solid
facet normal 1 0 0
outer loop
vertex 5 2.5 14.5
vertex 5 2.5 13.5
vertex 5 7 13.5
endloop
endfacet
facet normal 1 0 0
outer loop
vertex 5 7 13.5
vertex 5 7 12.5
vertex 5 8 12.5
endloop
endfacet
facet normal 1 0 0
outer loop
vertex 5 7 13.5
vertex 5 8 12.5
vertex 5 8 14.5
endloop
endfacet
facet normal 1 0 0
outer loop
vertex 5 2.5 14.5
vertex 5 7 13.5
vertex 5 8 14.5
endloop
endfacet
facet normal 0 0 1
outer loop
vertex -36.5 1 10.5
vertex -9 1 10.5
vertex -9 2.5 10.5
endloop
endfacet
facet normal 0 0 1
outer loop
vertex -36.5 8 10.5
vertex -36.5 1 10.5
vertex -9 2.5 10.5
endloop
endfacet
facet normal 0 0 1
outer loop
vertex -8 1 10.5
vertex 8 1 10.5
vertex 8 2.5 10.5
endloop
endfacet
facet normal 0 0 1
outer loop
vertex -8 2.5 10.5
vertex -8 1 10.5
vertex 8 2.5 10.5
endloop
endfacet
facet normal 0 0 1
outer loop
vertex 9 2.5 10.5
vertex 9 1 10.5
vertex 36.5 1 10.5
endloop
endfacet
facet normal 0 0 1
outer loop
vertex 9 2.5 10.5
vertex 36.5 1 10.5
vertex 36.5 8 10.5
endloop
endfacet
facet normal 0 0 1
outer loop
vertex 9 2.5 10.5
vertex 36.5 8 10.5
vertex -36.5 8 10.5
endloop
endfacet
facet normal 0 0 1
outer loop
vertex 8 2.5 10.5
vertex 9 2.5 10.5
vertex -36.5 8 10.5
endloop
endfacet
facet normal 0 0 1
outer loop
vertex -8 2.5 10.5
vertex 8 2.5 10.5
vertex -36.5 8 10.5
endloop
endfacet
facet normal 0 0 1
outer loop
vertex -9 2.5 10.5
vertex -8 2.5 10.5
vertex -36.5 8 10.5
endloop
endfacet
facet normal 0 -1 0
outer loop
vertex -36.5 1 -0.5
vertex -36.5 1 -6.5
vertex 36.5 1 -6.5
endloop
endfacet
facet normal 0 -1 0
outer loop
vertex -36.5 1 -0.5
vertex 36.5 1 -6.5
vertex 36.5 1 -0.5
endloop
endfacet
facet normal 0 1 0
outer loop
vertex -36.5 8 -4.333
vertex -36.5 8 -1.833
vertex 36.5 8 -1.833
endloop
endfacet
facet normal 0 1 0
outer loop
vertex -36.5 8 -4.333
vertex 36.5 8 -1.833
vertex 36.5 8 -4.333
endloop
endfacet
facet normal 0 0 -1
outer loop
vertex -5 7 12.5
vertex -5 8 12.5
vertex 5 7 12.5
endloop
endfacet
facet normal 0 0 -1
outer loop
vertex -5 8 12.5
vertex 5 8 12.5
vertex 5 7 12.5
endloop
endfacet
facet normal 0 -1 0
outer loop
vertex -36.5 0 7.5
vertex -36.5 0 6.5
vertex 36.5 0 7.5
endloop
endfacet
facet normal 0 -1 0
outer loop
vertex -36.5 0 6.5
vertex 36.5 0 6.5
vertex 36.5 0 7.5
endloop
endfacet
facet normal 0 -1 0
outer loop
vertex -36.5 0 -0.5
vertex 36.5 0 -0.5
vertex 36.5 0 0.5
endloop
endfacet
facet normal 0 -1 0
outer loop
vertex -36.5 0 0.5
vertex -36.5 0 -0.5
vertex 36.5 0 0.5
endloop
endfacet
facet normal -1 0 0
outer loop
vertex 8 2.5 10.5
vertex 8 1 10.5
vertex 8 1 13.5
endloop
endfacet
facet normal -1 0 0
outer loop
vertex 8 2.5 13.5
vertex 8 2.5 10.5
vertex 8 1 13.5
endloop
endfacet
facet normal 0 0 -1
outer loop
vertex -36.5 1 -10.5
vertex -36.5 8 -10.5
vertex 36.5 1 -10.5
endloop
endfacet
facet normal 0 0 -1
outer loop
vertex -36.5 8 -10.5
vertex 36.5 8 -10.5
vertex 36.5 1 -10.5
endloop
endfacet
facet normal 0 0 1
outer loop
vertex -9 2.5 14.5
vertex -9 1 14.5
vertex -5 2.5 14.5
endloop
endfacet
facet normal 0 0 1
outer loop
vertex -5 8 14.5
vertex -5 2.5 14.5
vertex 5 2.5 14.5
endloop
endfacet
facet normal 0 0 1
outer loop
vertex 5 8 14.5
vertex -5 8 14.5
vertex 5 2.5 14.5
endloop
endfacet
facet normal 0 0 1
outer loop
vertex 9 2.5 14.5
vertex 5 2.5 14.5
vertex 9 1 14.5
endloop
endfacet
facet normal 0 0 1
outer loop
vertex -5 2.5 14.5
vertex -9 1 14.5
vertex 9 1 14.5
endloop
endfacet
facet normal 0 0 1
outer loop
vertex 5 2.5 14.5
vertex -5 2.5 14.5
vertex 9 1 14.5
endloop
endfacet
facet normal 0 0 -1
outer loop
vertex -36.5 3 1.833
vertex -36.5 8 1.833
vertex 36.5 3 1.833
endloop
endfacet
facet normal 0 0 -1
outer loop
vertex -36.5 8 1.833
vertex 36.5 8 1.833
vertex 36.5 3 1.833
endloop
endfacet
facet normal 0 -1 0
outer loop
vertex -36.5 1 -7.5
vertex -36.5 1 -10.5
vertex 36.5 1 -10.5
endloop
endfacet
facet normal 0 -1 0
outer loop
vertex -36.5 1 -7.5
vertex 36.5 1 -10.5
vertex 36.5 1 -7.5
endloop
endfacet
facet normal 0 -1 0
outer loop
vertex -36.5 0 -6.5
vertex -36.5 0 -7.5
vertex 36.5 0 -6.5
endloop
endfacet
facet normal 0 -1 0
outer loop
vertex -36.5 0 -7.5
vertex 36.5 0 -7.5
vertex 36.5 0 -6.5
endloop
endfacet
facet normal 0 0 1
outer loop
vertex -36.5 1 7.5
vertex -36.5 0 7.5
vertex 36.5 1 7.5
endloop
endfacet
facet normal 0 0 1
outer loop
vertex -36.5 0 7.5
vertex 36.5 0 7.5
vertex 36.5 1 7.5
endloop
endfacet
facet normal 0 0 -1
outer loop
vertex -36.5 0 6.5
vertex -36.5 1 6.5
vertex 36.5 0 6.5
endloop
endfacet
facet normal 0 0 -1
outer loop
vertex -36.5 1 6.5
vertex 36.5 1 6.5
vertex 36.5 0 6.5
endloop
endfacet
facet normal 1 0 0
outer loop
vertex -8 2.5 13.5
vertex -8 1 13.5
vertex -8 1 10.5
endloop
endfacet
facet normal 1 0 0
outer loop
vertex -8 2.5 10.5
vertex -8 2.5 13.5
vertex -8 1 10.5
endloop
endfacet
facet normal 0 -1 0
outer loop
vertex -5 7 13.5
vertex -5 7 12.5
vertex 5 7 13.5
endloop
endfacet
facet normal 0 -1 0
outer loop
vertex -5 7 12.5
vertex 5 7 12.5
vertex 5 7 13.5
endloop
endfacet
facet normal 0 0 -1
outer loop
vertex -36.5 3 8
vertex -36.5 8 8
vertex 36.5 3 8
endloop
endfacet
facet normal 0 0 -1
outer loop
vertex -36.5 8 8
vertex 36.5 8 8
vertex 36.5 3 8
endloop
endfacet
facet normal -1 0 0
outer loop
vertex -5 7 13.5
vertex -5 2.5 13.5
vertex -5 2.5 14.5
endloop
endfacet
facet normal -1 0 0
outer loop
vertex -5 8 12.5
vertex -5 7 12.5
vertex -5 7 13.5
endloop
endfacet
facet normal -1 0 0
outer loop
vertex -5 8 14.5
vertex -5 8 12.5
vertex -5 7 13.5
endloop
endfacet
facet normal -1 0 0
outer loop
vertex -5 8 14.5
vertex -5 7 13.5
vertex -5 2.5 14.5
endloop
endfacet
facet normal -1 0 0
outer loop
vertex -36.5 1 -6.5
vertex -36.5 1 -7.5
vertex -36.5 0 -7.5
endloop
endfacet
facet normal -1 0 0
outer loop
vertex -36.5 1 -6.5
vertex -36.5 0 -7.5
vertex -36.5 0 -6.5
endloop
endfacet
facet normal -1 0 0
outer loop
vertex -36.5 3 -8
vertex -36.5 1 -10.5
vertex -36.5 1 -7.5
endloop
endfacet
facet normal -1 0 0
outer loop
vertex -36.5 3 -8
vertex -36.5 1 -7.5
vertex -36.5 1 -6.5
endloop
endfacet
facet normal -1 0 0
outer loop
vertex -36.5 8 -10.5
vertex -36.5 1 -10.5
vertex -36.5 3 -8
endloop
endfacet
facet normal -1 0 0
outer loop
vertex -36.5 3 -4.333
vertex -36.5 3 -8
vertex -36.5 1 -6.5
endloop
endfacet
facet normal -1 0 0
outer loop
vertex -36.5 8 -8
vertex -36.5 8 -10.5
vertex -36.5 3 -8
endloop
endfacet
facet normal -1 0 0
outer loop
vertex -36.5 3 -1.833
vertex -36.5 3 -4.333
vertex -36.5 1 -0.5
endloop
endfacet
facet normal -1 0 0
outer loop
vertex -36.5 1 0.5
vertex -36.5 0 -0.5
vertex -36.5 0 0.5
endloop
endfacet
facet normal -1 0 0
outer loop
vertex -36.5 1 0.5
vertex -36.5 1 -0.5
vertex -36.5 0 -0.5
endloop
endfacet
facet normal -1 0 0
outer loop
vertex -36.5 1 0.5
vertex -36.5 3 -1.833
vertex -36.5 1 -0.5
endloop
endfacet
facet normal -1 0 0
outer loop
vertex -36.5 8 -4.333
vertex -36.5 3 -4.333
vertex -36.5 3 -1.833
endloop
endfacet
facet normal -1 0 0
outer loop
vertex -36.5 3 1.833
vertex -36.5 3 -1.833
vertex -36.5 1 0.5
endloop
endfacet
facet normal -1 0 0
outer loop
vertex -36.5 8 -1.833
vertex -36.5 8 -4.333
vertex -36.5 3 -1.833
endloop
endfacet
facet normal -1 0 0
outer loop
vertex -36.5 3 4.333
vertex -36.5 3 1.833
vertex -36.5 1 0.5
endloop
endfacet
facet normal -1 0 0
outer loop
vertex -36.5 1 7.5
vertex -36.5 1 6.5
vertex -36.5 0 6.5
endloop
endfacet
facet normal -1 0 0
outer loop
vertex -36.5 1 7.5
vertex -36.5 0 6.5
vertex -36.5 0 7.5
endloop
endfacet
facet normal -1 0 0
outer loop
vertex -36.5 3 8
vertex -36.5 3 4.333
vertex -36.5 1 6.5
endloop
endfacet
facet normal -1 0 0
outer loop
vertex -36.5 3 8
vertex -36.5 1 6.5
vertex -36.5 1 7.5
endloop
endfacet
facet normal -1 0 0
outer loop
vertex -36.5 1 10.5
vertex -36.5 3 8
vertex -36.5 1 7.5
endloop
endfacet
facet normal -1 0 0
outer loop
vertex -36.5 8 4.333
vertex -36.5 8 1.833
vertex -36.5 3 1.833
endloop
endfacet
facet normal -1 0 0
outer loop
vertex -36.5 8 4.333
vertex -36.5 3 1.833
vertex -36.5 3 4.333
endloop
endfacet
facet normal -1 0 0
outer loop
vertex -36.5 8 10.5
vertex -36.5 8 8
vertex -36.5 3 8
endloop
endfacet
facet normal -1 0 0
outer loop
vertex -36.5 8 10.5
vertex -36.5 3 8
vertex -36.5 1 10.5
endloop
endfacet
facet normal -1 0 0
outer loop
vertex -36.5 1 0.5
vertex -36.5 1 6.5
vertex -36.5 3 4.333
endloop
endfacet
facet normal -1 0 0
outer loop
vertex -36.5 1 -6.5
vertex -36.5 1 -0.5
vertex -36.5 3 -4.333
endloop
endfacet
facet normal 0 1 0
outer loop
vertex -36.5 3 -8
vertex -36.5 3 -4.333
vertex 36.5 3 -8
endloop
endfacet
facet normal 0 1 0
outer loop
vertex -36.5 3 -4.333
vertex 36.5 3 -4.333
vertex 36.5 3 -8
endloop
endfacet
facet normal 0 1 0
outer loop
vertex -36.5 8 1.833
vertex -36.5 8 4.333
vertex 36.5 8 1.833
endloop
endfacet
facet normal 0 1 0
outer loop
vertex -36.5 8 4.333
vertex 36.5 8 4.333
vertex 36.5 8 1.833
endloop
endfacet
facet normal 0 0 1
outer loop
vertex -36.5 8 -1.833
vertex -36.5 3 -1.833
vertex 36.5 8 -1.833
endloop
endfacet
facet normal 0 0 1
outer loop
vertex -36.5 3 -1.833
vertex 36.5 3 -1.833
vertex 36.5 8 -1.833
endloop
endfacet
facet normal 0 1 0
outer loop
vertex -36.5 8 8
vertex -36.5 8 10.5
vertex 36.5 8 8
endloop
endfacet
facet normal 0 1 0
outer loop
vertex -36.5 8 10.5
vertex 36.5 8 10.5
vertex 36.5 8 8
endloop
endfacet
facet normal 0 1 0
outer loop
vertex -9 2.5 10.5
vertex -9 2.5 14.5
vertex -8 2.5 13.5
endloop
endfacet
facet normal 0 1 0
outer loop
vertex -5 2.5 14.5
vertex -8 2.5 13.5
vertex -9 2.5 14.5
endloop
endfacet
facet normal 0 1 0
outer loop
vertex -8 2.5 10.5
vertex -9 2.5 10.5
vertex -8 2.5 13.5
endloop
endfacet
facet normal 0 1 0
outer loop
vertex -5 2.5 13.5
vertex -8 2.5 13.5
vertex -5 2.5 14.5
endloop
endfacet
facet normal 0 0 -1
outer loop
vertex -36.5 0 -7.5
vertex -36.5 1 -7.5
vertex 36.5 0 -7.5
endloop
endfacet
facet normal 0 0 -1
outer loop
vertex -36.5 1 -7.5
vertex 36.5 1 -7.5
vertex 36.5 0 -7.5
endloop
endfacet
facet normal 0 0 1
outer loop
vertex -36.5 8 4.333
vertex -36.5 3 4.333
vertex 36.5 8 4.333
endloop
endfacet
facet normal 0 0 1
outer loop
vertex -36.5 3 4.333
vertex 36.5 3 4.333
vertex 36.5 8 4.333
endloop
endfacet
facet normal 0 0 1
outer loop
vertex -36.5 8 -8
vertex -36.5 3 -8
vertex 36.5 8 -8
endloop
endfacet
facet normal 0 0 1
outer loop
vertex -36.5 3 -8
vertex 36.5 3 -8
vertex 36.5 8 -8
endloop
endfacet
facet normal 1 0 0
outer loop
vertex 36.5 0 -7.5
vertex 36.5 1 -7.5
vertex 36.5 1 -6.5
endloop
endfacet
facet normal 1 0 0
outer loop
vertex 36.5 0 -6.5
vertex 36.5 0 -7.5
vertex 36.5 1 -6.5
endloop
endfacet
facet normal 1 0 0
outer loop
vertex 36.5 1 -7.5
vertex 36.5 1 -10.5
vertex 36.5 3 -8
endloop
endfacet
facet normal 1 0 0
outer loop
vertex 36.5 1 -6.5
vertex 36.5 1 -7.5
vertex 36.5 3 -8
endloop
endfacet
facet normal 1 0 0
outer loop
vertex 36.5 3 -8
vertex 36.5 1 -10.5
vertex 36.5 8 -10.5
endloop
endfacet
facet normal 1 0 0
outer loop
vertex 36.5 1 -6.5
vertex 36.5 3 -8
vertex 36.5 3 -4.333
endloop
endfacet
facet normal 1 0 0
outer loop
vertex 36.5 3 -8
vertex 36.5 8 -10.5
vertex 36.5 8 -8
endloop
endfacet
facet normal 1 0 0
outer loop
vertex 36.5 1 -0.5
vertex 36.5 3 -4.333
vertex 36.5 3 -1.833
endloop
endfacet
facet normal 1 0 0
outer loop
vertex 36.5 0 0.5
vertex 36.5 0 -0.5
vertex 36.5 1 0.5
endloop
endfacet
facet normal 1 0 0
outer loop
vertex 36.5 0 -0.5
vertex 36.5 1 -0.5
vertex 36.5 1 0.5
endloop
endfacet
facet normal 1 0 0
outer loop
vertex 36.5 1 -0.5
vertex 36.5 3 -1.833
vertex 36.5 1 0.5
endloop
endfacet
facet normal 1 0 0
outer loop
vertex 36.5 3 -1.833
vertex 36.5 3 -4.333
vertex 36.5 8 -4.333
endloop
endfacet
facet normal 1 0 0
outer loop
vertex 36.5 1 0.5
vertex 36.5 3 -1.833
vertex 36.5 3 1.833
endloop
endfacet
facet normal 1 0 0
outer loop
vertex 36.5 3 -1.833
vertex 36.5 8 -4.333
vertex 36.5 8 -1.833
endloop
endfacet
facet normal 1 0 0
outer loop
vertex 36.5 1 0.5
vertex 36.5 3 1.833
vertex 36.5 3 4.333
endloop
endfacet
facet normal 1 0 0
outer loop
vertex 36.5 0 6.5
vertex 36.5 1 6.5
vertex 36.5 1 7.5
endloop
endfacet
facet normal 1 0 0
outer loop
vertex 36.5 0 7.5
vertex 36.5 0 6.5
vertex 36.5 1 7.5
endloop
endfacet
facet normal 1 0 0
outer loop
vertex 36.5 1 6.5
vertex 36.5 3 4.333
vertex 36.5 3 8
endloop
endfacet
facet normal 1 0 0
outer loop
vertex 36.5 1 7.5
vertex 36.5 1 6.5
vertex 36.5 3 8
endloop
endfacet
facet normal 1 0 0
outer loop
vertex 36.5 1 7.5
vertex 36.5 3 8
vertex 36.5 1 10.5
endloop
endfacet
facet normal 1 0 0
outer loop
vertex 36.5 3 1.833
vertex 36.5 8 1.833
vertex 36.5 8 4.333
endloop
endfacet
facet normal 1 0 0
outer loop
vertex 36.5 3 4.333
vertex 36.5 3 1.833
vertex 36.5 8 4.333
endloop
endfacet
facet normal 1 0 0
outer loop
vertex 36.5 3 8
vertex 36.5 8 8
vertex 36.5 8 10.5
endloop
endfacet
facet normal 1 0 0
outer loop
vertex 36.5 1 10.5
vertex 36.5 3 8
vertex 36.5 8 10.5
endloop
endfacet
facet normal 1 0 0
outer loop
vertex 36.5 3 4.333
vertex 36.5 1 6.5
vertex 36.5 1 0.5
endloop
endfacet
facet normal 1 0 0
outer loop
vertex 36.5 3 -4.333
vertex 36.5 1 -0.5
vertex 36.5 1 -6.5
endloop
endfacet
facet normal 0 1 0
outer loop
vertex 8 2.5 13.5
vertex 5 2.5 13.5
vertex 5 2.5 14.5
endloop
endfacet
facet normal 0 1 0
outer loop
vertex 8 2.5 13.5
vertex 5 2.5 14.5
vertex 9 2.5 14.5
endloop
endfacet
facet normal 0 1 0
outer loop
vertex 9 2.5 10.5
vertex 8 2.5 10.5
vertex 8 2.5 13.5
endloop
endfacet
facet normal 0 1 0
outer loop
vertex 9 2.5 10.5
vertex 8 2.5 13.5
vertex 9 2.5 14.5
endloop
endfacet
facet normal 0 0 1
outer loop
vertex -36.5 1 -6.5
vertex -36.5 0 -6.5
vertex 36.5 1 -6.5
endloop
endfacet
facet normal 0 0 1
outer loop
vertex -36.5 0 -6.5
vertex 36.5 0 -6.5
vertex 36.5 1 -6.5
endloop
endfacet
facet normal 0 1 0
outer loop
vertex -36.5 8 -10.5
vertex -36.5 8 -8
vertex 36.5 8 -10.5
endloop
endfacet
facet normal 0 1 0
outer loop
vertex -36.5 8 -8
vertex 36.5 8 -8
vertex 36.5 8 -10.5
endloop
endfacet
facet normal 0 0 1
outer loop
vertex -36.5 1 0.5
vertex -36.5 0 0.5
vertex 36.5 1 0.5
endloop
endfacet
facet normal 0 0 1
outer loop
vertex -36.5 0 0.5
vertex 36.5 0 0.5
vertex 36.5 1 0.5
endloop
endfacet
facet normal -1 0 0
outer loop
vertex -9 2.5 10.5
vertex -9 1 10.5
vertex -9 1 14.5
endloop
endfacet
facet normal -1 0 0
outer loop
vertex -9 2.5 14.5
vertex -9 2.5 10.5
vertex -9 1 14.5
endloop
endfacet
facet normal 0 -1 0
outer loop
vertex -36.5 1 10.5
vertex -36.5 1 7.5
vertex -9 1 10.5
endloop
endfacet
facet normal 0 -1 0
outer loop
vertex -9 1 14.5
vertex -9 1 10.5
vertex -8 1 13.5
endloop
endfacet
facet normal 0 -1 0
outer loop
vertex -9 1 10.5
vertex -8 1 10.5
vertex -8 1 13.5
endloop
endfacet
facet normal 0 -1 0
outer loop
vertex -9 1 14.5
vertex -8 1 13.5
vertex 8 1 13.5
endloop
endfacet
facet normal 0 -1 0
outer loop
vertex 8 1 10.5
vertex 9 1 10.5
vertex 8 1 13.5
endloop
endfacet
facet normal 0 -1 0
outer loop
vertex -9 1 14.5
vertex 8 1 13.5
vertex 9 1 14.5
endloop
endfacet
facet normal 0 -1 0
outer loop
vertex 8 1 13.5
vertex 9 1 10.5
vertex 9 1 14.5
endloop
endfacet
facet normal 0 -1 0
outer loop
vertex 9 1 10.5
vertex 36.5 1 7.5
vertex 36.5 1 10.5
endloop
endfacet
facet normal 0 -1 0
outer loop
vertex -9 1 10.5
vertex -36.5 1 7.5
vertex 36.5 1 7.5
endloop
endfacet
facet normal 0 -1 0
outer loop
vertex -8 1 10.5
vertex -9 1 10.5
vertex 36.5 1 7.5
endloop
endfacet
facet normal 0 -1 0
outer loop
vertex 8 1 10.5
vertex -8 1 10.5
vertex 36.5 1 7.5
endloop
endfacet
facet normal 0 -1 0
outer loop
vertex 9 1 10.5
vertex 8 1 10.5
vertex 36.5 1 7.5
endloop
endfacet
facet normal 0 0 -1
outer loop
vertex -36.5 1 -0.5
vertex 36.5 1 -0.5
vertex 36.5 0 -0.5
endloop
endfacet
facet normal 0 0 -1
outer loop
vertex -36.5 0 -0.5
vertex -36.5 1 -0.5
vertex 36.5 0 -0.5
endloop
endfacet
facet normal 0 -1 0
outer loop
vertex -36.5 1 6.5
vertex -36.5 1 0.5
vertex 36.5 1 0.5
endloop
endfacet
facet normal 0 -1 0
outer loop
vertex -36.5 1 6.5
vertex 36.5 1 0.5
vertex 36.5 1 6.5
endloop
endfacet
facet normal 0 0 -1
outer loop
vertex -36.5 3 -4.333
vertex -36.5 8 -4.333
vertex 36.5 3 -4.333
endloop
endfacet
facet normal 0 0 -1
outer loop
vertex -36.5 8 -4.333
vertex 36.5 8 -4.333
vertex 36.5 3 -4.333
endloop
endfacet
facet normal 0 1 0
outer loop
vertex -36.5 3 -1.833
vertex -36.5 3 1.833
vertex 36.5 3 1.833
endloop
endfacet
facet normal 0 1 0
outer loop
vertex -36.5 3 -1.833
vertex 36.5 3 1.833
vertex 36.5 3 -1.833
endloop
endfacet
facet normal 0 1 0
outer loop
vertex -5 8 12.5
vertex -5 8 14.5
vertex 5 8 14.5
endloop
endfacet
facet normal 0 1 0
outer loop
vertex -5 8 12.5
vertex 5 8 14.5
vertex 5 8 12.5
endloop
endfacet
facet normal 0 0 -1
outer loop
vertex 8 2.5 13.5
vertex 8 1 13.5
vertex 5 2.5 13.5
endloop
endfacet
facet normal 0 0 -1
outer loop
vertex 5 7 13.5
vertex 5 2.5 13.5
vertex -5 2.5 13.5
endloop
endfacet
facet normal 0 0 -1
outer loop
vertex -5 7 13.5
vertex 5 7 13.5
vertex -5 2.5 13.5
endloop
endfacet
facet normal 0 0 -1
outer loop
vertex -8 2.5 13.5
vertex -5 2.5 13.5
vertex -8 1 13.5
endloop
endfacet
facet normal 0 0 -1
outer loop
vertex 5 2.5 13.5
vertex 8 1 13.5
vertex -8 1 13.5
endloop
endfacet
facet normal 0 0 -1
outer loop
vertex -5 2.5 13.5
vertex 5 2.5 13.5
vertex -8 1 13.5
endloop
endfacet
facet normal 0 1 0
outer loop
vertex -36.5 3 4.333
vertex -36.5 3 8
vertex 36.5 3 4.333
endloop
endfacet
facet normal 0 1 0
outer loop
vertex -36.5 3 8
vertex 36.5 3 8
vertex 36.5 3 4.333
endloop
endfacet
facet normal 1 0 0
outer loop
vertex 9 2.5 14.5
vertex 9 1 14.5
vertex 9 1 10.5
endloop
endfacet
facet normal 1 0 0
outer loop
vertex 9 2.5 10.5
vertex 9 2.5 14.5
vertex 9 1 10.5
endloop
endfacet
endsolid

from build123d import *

# Parameters (mm, degrees)
BOSS_EXTRUDE1_DEPTH = 36.5
EXTRUDE_THIN1_DEPTH = 1.5
EXTRUDE_THIN2_DEPTH = 5


with BuildPart() as part:
    # Sketch1 → Boss-Extrude1 (new, symmetric)
    with BuildSketch(Plane(origin=(0, 0, 0), x_dir=(0, 0, -1), z_dir=(1, 0, 0))):
        Polygon((0.5, 0), (-0.5, 0), (-0.5, 1), (-6.5, 1), (-6.5, 0), (-7.5, 0), (-7.5, 1), (-10.5, 1), (-10.5, 8), (-8, 8), (-8, 3), (-4.333333333, 3), (-4.333333333, 8), (-1.833333333, 8), (-1.833333333, 3), (1.833333333, 3), (1.833333333, 8), (4.333333333, 8), (4.333333333, 3), (8, 3), (8, 8), (10.5, 8), (10.5, 1), (7.5, 1), (7.5, 0), (6.5, 0), (6.5, 1), (0.5, 1), align=None)
    extrude(amount=BOSS_EXTRUDE1_DEPTH, both=True)

    # Sketch3 → Extrude-Thin1 (add)
    with BuildSketch(Plane(origin=(0, 1, 0), x_dir=(1, 0, 0), z_dir=(0, 1, 0))):
        Polygon((-9, -10.5), (-9, -14.5), (9, -14.5), (9, -10.5), (8, -10.5), (8, -13.5), (-8, -13.5), (-8, -10.5), align=None)
    extrude(amount=EXTRUDE_THIN1_DEPTH)

    # Sketch4 → Extrude-Thin2 (add, symmetric)
    with BuildSketch(Plane(origin=(0, 0, 0), x_dir=(0, 0, -1), z_dir=(1, 0, 0))):
        Polygon((-14.5, 2.5), (-14.5, 8), (-12.5, 8), (-12.5, 7), (-13.5, 7), (-13.5, 2.5), align=None)
    extrude(amount=EXTRUDE_THIN2_DEPTH, both=True)


solid = part.part
